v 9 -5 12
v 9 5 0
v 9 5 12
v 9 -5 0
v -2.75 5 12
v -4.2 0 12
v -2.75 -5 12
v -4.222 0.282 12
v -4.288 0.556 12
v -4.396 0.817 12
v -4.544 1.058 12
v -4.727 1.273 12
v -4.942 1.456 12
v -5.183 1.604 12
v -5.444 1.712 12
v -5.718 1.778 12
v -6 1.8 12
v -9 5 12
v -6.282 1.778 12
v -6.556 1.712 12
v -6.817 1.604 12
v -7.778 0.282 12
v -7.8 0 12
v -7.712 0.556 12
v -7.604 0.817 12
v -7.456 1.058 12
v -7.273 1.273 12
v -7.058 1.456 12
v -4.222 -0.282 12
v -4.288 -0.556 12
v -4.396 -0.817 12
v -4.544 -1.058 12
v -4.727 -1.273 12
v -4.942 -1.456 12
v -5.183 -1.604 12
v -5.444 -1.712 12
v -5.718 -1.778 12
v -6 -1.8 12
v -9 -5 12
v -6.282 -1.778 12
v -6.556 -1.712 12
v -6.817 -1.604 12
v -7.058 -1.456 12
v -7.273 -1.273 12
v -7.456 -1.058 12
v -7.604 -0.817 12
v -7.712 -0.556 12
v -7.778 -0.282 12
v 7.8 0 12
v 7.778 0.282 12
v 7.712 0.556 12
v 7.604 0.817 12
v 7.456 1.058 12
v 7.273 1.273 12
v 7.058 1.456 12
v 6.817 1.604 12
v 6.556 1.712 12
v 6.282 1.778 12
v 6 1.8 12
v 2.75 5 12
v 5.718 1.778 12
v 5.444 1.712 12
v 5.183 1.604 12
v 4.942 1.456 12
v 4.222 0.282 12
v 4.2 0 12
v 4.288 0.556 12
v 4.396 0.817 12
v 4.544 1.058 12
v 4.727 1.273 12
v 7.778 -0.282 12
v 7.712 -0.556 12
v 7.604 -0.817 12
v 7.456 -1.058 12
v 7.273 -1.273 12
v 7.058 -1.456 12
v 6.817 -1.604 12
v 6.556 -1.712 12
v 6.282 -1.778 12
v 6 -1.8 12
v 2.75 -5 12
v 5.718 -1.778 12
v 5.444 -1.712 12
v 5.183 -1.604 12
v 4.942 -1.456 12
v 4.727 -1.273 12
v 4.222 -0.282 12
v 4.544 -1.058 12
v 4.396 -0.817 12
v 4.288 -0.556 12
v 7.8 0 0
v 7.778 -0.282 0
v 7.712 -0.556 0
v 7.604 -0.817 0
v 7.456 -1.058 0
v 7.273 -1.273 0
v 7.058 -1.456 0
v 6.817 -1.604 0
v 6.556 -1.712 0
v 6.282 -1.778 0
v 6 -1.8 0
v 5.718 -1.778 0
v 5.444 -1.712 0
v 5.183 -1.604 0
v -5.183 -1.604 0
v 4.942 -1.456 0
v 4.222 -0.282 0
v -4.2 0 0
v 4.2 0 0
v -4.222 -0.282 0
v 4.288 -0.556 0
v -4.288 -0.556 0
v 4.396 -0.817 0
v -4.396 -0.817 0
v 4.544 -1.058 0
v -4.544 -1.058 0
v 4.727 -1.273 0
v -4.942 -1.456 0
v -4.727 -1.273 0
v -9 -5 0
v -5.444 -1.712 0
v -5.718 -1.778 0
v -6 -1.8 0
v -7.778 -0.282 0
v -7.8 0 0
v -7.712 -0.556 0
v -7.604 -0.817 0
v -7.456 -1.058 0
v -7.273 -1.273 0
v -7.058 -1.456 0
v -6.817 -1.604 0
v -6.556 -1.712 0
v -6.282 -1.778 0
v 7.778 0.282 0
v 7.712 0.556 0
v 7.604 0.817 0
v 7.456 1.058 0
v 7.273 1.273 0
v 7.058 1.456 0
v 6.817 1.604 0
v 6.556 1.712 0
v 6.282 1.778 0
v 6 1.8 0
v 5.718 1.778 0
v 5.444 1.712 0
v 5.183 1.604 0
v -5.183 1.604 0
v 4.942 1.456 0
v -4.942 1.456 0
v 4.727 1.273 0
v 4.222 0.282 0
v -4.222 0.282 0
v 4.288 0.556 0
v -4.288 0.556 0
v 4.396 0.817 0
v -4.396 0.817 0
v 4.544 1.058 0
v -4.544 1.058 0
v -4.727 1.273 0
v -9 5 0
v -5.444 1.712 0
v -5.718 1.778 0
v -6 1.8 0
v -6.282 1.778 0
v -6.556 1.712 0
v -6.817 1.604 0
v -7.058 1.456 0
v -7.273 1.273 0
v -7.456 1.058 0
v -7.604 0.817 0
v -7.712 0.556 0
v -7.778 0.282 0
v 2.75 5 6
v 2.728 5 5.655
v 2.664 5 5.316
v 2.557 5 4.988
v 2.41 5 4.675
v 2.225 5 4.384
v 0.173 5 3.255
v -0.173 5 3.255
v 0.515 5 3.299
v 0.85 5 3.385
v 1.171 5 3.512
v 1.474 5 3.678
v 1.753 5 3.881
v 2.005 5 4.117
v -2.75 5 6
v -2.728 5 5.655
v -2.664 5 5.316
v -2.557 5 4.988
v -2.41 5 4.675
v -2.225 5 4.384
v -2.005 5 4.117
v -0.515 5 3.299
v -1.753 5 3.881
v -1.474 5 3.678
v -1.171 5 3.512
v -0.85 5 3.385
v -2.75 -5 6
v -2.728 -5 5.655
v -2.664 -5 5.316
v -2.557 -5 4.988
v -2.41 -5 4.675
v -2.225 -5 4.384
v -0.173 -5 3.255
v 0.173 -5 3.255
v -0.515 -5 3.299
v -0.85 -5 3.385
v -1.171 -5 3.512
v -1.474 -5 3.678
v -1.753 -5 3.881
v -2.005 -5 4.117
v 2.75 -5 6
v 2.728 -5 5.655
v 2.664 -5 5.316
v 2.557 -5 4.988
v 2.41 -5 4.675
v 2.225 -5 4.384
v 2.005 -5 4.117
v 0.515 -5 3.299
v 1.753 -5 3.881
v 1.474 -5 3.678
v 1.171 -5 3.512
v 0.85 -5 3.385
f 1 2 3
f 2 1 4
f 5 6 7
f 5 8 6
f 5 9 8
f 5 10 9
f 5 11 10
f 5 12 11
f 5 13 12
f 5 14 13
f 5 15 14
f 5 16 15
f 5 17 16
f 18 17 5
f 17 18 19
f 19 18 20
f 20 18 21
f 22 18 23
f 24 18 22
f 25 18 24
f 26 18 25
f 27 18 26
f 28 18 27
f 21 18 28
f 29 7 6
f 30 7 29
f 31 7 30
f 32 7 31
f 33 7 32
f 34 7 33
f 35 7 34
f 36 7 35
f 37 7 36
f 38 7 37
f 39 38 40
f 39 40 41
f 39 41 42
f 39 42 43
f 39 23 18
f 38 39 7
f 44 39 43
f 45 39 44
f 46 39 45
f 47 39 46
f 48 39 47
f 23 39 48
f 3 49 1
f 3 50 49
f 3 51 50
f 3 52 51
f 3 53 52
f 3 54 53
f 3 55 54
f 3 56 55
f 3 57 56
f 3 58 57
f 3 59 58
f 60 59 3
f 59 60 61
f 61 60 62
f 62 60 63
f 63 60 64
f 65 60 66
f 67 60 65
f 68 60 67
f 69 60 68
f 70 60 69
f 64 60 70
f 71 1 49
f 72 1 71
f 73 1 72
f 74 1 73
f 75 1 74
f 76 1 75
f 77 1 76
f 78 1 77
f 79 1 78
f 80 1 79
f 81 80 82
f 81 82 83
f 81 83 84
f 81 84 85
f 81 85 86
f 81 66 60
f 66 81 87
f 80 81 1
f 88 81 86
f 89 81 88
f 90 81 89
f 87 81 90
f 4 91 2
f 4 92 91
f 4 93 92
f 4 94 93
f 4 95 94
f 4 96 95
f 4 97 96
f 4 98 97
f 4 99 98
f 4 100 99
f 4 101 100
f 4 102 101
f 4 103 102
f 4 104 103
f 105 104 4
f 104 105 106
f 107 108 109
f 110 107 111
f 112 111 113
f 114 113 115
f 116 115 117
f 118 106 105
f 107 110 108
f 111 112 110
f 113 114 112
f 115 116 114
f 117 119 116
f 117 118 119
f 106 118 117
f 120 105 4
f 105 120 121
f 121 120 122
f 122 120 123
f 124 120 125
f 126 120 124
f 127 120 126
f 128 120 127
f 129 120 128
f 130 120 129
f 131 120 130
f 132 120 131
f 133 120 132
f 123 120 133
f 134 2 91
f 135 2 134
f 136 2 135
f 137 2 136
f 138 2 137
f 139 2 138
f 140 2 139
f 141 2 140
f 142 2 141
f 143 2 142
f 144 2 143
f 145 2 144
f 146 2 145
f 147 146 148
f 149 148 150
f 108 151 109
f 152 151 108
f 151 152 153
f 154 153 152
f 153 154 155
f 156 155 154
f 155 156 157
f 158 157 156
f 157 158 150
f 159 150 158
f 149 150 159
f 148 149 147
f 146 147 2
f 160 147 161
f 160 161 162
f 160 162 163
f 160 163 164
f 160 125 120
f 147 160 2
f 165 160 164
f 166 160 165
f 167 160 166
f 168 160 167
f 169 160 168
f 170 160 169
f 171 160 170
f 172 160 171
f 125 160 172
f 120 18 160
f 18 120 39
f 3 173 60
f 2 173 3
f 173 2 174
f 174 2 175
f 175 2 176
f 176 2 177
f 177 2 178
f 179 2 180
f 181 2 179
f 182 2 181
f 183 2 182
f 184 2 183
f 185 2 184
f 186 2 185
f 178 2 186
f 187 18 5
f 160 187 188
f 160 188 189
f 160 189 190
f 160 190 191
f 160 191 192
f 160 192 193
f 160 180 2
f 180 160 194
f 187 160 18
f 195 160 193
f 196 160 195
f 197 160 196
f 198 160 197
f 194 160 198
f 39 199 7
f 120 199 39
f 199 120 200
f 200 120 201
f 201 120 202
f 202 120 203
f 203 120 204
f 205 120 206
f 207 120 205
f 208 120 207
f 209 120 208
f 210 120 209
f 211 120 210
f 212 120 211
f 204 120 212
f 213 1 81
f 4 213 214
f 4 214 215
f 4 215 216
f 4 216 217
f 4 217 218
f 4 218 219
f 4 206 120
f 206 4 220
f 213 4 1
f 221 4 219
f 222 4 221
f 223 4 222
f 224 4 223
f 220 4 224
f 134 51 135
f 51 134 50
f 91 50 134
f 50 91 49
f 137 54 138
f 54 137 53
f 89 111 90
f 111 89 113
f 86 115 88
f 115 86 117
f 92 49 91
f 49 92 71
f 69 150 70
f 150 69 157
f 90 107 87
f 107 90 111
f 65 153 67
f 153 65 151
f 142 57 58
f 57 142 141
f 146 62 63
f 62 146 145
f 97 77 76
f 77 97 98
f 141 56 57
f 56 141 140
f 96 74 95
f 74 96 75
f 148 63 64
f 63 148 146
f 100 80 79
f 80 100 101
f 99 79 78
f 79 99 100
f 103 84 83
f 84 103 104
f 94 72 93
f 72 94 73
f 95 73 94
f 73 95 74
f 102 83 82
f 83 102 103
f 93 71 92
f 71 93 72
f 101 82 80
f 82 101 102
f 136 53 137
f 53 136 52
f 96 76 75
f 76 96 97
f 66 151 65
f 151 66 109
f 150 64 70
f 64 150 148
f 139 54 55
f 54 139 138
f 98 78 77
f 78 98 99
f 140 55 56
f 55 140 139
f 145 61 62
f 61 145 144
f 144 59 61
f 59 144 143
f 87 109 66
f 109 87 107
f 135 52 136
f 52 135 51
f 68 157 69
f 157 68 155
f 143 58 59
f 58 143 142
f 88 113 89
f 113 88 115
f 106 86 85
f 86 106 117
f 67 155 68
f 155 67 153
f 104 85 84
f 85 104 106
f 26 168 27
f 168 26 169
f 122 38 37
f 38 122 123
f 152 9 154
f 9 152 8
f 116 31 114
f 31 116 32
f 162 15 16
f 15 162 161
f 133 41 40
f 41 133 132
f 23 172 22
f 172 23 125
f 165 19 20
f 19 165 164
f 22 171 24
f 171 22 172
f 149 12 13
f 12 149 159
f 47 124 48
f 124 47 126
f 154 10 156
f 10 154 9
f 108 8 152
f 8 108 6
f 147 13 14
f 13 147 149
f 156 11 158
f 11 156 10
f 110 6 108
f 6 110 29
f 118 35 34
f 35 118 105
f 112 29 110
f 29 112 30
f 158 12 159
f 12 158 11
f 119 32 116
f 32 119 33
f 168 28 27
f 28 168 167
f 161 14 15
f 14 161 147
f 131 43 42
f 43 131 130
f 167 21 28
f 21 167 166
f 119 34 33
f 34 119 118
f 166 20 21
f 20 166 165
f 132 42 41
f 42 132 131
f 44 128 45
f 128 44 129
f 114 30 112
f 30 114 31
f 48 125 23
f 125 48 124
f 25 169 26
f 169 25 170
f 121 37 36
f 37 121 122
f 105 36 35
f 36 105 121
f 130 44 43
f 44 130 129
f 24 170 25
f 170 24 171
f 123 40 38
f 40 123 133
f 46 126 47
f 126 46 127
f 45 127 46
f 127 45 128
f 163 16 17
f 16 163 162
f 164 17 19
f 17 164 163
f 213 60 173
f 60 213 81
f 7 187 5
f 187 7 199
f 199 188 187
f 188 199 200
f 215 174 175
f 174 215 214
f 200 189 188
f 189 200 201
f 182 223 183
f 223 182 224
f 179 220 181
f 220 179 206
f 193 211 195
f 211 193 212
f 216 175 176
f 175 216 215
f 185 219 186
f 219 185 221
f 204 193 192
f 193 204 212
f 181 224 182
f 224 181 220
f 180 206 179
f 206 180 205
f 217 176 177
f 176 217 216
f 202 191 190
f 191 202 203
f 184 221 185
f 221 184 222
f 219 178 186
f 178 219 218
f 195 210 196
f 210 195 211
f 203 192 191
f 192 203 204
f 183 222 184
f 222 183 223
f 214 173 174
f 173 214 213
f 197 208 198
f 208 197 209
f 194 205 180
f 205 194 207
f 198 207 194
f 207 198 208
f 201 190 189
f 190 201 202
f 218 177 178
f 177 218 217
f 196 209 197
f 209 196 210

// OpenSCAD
   spacer_height = 12; //Heights of less than 10 are not recommended
   
   difference(){
   translate([-9,-5,0]) cube([18,10,spacer_height]);
   
   translate([6,0,-1]) cylinder(r=3.6/2,h=spacer_height+2,$fn=40);
   
   translate([-6,0,-1]) cylinder(r=3.6/2,h=spacer_height+2,$fn=40);
   
   translate([-2.75,-7,spacer_height - 6]) cube([5.5,14,7]);
   
   translate([0,6,spacer_height - 6]) rotate([90,0,0]) cylinder(r=5.5/2,h=12,$fn=50);
       
  
   }
 
